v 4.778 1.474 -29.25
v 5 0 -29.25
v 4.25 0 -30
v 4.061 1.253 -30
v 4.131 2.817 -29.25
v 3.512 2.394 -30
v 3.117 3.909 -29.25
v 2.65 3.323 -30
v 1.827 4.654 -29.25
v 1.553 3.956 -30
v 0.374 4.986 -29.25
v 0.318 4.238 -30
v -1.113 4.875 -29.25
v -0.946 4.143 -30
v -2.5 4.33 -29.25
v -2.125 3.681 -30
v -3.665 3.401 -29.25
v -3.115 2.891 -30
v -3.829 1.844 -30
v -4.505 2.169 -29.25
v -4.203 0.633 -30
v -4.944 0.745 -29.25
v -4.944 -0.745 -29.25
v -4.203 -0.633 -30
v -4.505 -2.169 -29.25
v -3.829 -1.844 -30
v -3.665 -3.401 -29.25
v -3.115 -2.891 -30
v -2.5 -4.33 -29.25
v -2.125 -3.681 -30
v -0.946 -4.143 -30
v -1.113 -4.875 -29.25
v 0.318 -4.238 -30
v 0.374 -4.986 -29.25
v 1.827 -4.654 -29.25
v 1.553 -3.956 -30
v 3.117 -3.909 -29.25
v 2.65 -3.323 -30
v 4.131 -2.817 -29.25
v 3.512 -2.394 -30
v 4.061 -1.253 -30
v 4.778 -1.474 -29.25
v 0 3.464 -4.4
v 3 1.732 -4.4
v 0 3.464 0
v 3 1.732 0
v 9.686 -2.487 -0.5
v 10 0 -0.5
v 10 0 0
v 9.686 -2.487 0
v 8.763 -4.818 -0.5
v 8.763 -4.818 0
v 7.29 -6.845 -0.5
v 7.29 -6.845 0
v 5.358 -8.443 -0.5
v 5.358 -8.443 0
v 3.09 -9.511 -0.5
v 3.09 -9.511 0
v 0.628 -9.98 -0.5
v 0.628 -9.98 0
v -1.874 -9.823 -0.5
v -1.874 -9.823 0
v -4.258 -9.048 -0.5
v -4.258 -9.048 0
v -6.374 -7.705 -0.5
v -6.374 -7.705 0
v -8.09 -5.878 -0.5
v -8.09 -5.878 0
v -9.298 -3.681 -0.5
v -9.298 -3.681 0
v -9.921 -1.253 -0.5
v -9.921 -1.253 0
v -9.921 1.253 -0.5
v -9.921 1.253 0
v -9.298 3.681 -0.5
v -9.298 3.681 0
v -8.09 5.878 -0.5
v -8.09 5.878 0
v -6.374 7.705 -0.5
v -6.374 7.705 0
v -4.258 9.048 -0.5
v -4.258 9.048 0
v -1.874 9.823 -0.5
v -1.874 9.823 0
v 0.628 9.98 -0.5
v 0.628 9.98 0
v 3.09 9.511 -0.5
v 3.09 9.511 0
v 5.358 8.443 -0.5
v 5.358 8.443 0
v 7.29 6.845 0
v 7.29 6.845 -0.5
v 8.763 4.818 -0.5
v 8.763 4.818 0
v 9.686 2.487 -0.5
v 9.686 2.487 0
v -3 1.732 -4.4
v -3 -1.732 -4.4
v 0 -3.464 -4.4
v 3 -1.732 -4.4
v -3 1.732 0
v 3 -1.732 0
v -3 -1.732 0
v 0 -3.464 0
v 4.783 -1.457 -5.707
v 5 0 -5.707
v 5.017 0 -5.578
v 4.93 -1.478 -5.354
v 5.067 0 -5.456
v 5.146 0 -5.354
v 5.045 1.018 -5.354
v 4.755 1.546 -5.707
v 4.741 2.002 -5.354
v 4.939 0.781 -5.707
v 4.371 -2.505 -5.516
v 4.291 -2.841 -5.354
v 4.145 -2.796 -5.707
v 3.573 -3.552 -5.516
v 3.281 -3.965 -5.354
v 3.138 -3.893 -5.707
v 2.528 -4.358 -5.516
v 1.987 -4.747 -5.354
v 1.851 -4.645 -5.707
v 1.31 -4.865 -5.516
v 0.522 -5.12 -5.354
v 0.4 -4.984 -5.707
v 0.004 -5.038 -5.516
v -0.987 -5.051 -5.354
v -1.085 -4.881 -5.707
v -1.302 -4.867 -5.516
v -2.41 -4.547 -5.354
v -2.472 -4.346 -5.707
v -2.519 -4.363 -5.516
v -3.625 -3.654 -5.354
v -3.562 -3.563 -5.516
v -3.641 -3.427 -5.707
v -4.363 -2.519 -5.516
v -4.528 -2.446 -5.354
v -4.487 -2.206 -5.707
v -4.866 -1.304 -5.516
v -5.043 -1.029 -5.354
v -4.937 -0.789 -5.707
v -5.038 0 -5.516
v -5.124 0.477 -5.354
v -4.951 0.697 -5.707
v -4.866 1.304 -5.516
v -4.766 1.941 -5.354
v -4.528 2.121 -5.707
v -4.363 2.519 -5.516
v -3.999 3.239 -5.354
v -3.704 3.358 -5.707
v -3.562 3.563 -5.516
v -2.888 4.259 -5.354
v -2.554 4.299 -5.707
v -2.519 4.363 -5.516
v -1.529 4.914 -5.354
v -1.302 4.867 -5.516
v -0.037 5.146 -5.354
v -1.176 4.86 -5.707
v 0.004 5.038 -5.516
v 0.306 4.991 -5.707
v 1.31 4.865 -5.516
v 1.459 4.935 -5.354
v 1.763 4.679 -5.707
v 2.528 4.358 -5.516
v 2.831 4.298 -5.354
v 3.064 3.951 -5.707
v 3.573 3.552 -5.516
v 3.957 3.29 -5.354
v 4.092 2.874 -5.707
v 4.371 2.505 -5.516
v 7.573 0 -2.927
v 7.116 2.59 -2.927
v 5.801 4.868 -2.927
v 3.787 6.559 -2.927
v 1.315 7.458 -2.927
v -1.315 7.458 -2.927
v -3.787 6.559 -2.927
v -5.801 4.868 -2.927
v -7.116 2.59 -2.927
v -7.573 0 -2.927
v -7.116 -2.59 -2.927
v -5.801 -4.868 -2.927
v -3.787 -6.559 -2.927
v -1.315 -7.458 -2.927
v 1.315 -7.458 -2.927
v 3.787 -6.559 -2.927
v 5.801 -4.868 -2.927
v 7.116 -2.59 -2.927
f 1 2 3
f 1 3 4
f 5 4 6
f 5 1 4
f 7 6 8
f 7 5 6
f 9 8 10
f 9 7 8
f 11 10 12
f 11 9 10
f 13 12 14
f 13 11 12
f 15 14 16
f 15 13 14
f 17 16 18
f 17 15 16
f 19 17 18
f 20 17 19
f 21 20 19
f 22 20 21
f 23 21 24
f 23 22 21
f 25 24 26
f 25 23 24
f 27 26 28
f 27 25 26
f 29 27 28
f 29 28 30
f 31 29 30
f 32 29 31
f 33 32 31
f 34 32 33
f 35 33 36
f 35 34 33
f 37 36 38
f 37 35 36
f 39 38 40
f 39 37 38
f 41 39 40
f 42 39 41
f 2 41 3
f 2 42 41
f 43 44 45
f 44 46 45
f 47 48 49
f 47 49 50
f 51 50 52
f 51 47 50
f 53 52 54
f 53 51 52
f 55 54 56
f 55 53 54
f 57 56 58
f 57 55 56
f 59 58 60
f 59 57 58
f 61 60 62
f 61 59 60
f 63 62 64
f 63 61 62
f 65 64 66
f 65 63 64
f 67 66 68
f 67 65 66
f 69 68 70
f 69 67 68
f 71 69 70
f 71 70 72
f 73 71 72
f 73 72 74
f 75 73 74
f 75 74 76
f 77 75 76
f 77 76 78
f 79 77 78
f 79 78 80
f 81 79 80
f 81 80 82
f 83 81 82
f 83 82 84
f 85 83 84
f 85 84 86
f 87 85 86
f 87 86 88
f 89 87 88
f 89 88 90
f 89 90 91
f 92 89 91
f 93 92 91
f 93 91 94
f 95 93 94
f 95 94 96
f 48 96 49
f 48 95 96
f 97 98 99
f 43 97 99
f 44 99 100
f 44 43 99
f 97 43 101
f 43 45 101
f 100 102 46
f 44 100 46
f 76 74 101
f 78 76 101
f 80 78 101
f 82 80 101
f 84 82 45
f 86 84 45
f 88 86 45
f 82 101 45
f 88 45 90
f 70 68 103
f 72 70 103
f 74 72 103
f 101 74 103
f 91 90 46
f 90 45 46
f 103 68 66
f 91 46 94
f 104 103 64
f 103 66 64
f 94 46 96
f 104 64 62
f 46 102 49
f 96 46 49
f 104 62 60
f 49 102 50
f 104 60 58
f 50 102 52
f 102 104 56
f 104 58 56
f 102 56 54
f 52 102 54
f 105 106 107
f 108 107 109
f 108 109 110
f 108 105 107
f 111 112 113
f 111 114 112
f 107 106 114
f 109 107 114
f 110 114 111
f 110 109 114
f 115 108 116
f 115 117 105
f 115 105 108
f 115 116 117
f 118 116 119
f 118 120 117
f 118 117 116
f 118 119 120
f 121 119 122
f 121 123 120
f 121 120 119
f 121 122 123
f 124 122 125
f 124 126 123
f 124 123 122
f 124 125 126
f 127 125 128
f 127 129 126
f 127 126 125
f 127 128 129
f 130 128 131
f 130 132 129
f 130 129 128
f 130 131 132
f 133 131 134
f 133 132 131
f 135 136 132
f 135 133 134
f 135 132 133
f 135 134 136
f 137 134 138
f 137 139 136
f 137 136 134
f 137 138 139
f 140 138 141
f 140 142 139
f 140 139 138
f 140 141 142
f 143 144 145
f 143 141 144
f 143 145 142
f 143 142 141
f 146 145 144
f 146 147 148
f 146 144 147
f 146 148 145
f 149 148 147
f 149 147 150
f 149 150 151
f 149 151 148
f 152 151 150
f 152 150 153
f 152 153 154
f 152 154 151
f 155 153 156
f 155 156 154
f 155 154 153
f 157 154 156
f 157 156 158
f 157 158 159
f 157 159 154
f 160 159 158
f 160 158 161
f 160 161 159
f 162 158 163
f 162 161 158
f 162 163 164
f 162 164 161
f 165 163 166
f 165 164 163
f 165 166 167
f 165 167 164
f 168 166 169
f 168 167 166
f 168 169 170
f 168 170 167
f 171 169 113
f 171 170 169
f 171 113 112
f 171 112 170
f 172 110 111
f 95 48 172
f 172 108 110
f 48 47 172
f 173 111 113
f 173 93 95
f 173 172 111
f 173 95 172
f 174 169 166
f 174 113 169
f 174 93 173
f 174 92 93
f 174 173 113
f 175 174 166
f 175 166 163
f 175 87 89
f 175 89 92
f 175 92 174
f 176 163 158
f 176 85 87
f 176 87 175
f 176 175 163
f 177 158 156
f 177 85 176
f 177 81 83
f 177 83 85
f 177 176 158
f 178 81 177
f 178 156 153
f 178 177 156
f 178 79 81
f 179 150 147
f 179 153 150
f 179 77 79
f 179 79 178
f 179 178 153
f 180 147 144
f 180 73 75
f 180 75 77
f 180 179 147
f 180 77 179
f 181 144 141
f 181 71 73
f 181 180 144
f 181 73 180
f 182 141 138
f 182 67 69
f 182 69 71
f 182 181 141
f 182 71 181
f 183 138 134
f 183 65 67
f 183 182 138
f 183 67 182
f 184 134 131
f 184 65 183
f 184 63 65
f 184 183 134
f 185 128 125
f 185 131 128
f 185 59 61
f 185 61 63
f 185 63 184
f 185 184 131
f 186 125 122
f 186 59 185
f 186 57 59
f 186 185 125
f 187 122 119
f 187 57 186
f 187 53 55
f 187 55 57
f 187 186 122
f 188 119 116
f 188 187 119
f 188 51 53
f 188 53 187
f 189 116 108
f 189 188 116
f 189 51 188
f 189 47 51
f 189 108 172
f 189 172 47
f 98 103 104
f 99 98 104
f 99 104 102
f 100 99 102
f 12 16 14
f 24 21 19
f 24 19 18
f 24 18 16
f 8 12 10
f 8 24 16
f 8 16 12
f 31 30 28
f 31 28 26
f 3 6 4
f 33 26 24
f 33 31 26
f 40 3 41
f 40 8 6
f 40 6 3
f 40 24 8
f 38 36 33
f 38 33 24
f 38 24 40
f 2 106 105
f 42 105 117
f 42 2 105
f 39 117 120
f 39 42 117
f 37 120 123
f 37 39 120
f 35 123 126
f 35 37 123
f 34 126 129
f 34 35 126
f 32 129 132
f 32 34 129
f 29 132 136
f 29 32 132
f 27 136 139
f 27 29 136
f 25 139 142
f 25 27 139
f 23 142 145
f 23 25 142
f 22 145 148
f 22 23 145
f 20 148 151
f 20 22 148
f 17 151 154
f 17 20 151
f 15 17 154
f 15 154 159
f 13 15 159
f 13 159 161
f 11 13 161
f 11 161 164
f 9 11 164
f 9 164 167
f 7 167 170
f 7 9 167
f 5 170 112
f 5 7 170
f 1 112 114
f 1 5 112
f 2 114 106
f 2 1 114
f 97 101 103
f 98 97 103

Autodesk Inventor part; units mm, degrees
ref_plane "YZ Plane" through (0, 0, 0) normal (1, 0, 0) x (0, 1, 0)
sketch "Sketch1" plane through (0, 0, 0) normal (0, 1, 0) x (-1, 0, 0)
  point P0 (0, 0)
sketch "Sketch2" plane through (0, 0, 0) normal (0, 1, 0) x (-1, 0, 0)
  line L0 (-5, -30) -> (0, -30)
  line L1 (-5, -5.5) -> (-5, -30)
  line L2 (-10, -0.5) -> (-5, -5.5)
  line L3 (-10, 0) -> (-10, -0.5)
  line L4 (0, 0) -> (-10, 0)
  line L5 (0, -30) -> (0, 0)
  line L6 (0, -30) -> (0, 0)
  line L7 (0, -36) -> (0, 6) projected
  line L8 (2, 0) -> (-12, 0) projected
  dimension "d3" = 10
  dimension "d5" = 5
  dimension "d7" = 30
  dimension "ParC" = 0.5
  dimension "d22" = 0
  dimension "d23" = 0
  dimension "d43" = 45
revolve "Revolution1" add sketch "Sketch2" angle 360 about axis through (0, 0, -30) along (0, 0, -1)
sketch "Sketch3" plane through (0, 0, 0) normal (0, 0, 1) x (1, 0, 0)
  line L0 (-3, 1.7321) -> (-3, -1.7321)
  line L1 (0, 3.4641) -> (-3, 1.7321)
  line L2 (3, 1.7321) -> (0, 3.4641)
  line L3 (3, -1.7321) -> (3, 1.7321)
  line L4 (0, -3.4641) -> (3, -1.7321)
  line L5 (-3, -1.7321) -> (0, -3.4641)
  circle A0 centre (0, 0) radius 3 construction
  circle A1 centre (0, 0) radius 5 construction
  dimension "d11" = 6
  dimension "d13" = 120
  dimension "d15" = 120
extrude "Extrusion1" cut sketch "Sketch3" against normal blind 4.4
fillet "Fillet1" radius 0.5 1 edges at (-5, 0, -5.5)
chamfer "Chamfer1" distance 0.75 angle 45 1 edges at (-5, 0, -30) measured on face at (-4.674, 1.7759, -21.9024)
thread "Thread1" size "M10x1.5" class "6g" standard "ISO Metric profile" length 21.5
ref_plane "MSC_PF1" through (0, 0, 0) normal (1, 0, 0) x (0, 1, 0)
ref_plane "MSC_PT1" through (0, 0, 0) normal (0, 0, -1) x (-1, 0, 0)
equation "\"d3\" = 0.5 * dk"
equation "\"d5\" = 0.5 * NND"
equation "\"d7\" = NLG"
equation "\"d43\" = 0.5 * ang"
equation "\"d18\" = r"
equation "\"d19\" = 0.5 * PTC"
equation "\"d39\" = 0.5 * PTC"
equation "\"d11\" = ParS"
equation "\"d16\" = ParT"
equation "\"PTC\" = 1.5"
equation "\"ParK\" = 5.5"
equation "\"ParS\" = 6"
equation "\"ParT\" = 4.4"
equation "\"r\" = 0.5"
equation "\"NLG\" = 30"
equation "\"ang\" = 90deg"
equation "\"dk\" = 20"
equation "\"NND\" = 10"
properties part number "DIN 7991 - M10x30" material "Steel, Mild"
